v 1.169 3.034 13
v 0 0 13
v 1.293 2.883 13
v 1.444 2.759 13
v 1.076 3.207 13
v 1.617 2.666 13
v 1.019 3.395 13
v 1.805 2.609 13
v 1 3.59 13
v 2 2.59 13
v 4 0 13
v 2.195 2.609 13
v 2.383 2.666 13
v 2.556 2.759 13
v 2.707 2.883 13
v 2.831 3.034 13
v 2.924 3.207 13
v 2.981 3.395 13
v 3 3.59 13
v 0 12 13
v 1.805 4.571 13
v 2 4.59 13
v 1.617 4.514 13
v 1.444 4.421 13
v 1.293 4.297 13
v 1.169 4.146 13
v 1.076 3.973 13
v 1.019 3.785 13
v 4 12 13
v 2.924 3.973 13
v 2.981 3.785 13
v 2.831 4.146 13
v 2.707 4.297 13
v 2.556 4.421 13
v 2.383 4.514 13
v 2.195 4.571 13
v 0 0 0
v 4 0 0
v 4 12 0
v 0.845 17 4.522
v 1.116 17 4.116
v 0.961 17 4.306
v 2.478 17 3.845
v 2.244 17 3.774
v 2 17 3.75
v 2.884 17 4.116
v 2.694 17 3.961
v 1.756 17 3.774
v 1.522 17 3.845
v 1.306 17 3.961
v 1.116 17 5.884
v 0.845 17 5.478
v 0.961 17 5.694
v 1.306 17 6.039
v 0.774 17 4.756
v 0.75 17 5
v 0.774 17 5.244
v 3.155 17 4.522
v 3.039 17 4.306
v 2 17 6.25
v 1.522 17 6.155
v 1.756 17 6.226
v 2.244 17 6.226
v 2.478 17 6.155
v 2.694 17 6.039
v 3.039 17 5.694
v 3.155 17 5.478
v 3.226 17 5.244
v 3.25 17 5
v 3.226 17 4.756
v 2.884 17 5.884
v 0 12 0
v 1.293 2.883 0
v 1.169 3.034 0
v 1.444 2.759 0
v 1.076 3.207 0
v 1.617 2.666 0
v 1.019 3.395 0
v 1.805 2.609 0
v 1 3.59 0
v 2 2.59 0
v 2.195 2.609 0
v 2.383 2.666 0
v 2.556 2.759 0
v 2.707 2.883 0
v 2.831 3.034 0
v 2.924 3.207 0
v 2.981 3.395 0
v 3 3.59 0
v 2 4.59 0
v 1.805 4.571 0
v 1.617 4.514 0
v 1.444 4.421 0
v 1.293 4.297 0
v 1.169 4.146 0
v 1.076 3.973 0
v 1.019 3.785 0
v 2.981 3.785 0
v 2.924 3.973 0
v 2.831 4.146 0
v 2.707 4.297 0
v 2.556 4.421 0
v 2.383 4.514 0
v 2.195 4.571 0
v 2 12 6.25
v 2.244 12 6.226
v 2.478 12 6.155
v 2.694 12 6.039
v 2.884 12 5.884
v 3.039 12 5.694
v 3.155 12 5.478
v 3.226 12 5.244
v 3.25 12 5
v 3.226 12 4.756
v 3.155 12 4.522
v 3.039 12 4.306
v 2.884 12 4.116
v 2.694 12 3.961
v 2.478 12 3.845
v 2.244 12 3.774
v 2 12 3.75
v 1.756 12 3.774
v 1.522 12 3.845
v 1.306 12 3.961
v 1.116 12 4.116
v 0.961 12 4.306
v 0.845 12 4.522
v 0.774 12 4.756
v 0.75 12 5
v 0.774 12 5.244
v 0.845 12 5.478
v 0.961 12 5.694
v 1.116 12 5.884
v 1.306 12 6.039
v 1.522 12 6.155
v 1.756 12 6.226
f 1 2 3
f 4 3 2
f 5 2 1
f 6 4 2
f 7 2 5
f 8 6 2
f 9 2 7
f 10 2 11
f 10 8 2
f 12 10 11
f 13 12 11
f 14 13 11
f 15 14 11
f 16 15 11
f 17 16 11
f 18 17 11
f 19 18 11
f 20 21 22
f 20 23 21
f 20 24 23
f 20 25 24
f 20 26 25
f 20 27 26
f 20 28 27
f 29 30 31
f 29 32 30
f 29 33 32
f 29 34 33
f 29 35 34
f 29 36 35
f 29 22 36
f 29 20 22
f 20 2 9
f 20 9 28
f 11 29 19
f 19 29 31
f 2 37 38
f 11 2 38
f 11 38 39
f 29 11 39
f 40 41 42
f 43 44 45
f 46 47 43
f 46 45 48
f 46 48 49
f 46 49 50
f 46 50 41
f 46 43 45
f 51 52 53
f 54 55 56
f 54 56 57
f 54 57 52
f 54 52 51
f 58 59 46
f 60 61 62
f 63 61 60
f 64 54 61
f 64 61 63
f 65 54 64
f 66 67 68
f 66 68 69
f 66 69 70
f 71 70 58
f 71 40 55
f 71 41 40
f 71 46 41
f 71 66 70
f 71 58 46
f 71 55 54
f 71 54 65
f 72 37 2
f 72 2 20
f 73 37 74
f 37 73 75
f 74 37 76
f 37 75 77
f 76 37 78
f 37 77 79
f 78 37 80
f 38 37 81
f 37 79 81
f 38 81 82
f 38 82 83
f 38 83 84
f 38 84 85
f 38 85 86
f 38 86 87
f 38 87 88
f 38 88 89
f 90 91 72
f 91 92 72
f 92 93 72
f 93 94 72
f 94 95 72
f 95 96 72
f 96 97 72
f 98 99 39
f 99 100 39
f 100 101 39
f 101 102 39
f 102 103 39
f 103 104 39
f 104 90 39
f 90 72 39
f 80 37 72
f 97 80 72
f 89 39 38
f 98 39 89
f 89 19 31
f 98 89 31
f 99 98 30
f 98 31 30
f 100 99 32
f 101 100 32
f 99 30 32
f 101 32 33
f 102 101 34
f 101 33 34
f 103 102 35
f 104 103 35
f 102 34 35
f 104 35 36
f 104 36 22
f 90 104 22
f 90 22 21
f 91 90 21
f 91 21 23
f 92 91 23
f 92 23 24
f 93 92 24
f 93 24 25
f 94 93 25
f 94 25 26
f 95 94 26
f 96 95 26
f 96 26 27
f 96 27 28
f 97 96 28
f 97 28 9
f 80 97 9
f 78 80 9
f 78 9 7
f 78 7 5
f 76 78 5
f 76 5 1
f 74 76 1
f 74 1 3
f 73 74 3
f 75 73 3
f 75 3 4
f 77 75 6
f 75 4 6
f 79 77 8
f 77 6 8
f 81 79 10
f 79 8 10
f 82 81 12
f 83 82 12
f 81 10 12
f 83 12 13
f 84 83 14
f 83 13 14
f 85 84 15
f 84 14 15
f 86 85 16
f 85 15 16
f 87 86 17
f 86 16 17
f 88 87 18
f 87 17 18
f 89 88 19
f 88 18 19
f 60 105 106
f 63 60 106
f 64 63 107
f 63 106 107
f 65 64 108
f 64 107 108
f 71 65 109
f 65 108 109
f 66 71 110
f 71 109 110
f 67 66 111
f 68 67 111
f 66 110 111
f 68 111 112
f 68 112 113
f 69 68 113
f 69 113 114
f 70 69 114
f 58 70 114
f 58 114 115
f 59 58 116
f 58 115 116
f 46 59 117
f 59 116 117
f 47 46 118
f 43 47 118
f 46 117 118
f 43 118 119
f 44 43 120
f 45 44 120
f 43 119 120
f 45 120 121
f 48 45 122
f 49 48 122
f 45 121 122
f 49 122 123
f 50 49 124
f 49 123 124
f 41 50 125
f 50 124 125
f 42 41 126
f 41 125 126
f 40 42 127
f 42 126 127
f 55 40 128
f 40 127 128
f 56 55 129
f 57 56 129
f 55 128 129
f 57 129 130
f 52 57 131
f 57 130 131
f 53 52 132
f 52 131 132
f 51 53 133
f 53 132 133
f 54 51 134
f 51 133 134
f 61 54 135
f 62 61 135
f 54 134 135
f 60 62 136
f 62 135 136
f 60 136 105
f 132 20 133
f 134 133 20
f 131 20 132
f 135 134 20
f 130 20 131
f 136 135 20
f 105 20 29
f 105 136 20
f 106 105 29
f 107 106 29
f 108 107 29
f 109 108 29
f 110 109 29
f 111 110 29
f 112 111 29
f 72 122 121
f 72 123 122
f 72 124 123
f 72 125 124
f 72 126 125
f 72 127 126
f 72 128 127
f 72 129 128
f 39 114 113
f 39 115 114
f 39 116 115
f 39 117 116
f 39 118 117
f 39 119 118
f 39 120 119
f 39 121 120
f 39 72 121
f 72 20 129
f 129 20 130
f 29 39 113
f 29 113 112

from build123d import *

# Parameters (mm, degrees)
SKETCH_1_W          = 4
SKETCH_1_H          = 12
EXTRUDE_1_DEPTH     = 13
SKETCH_2_R          = 1.25
EXTRUDE_2_DEPTH     = 5
SKETCH_3_R          = 1
CUT_EXTRUDE_1_DEPTH = 22.771541057


with BuildPart() as part:
    # 草图1 → 凸台-拉伸1 (new body)
    with BuildSketch(Plane.XY):
        with Locations((2, 6)):
            Rectangle(SKETCH_1_W, SKETCH_1_H)
    extrude(amount=EXTRUDE_1_DEPTH)

    # 草图2 → 凸台-拉伸2 (add)
    with BuildSketch(Plane(origin=(0, 12, 0), x_dir=(1, 0, 0), z_dir=(0, 1, 0))):
        with Locations(Location((2, -5, 0), (0, 0, 270))):
            Circle(SKETCH_2_R)
    extrude(amount=EXTRUDE_2_DEPTH)

    # 草图3 → 切除-拉伸1 (cut, through all)
    with BuildSketch(Plane.XY.offset(13)):
        with Locations((2, 3.59)):
            Circle(SKETCH_3_R)
    extrude(amount=-CUT_EXTRUDE_1_DEPTH, mode=Mode.SUBTRACT)


solid = part.part
